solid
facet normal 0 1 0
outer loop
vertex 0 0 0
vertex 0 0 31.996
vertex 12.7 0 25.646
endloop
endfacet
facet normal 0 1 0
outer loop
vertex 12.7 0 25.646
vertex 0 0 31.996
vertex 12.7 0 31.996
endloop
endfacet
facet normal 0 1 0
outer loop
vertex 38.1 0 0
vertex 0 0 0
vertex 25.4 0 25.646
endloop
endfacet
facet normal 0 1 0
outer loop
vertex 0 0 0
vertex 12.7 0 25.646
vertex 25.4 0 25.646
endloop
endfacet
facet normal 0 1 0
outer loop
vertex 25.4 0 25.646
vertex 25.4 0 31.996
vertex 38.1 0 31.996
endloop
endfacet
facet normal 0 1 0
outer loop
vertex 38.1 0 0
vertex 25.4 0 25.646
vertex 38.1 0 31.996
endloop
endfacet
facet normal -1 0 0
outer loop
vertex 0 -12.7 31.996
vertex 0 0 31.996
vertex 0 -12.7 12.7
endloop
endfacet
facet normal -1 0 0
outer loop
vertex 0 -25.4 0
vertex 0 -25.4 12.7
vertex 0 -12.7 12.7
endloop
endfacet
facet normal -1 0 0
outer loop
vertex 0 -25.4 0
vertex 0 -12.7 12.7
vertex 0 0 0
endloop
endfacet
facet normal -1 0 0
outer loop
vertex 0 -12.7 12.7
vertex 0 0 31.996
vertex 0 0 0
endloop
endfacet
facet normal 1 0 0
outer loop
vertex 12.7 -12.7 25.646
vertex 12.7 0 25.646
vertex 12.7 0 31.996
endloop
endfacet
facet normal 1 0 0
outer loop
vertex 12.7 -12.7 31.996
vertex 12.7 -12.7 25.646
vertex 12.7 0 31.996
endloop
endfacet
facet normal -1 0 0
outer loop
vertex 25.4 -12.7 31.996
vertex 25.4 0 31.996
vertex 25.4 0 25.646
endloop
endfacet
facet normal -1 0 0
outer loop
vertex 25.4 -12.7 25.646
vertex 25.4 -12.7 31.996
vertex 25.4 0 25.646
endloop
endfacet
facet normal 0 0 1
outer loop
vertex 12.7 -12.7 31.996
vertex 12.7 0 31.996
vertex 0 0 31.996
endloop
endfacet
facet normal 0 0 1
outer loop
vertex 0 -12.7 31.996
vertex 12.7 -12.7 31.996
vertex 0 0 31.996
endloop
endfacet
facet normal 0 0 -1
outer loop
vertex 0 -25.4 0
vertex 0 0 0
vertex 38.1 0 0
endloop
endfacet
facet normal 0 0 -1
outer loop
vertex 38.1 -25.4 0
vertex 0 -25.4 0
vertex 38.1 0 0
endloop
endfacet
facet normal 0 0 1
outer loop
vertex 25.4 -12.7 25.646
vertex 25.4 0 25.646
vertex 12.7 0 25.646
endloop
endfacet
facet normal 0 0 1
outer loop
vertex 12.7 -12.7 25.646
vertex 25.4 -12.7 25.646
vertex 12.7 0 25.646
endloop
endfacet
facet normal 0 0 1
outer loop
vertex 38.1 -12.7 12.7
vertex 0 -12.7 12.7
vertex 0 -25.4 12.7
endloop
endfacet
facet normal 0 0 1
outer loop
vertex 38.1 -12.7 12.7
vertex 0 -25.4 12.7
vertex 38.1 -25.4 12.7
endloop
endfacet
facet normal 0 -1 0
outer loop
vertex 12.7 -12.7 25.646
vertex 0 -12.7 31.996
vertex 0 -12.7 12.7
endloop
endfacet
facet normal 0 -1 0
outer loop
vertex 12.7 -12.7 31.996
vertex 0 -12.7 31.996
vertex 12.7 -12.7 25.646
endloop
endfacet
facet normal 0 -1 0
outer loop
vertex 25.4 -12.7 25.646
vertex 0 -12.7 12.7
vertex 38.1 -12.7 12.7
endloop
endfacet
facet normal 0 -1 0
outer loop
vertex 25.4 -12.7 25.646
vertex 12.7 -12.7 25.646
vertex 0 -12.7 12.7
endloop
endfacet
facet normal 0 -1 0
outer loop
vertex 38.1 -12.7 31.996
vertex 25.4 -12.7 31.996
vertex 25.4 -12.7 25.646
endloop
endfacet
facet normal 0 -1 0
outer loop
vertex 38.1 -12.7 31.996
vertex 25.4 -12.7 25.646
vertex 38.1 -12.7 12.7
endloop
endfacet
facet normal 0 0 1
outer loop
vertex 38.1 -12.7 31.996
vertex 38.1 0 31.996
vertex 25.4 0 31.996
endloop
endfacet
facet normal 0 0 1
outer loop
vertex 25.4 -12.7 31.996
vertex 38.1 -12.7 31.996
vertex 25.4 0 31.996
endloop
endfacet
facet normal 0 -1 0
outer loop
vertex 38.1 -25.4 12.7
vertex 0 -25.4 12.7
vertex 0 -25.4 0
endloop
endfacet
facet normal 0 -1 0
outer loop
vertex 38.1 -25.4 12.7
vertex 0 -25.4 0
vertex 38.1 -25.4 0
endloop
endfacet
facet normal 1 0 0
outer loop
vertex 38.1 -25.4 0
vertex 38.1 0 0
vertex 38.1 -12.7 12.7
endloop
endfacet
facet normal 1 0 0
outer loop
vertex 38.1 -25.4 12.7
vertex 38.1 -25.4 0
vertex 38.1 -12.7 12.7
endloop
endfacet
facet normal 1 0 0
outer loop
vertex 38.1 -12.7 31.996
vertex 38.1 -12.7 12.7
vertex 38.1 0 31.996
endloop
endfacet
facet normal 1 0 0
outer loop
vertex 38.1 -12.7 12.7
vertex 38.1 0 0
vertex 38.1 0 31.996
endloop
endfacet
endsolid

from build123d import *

# Parameters (mm, degrees)
F0_W     = 38.1
F0_H     = 12.7
F1_DEPTH = 25.4
F3_DEPTH = 12.7


with BuildPart() as f1:
    # F0 (on Front) → F1 (new body)
    with BuildSketch(Plane.XZ):
        with Locations((19.05, 6.35)):
            Rectangle(F0_W, F0_H)
    extrude(amount=F1_DEPTH)

    # F2 (on Front) → F3 (join)
    with BuildSketch(Plane.XZ):
        Polygon((0, 31.995658), (0, 12.945658), (0, 0), (38.1, 0), (38.1, 31.995658), (25.4, 31.995658), (25.4, 25.645658), (12.7, 25.645658), (12.7, 31.995658), align=None)
    extrude(amount=F3_DEPTH)


solid = f1.part
